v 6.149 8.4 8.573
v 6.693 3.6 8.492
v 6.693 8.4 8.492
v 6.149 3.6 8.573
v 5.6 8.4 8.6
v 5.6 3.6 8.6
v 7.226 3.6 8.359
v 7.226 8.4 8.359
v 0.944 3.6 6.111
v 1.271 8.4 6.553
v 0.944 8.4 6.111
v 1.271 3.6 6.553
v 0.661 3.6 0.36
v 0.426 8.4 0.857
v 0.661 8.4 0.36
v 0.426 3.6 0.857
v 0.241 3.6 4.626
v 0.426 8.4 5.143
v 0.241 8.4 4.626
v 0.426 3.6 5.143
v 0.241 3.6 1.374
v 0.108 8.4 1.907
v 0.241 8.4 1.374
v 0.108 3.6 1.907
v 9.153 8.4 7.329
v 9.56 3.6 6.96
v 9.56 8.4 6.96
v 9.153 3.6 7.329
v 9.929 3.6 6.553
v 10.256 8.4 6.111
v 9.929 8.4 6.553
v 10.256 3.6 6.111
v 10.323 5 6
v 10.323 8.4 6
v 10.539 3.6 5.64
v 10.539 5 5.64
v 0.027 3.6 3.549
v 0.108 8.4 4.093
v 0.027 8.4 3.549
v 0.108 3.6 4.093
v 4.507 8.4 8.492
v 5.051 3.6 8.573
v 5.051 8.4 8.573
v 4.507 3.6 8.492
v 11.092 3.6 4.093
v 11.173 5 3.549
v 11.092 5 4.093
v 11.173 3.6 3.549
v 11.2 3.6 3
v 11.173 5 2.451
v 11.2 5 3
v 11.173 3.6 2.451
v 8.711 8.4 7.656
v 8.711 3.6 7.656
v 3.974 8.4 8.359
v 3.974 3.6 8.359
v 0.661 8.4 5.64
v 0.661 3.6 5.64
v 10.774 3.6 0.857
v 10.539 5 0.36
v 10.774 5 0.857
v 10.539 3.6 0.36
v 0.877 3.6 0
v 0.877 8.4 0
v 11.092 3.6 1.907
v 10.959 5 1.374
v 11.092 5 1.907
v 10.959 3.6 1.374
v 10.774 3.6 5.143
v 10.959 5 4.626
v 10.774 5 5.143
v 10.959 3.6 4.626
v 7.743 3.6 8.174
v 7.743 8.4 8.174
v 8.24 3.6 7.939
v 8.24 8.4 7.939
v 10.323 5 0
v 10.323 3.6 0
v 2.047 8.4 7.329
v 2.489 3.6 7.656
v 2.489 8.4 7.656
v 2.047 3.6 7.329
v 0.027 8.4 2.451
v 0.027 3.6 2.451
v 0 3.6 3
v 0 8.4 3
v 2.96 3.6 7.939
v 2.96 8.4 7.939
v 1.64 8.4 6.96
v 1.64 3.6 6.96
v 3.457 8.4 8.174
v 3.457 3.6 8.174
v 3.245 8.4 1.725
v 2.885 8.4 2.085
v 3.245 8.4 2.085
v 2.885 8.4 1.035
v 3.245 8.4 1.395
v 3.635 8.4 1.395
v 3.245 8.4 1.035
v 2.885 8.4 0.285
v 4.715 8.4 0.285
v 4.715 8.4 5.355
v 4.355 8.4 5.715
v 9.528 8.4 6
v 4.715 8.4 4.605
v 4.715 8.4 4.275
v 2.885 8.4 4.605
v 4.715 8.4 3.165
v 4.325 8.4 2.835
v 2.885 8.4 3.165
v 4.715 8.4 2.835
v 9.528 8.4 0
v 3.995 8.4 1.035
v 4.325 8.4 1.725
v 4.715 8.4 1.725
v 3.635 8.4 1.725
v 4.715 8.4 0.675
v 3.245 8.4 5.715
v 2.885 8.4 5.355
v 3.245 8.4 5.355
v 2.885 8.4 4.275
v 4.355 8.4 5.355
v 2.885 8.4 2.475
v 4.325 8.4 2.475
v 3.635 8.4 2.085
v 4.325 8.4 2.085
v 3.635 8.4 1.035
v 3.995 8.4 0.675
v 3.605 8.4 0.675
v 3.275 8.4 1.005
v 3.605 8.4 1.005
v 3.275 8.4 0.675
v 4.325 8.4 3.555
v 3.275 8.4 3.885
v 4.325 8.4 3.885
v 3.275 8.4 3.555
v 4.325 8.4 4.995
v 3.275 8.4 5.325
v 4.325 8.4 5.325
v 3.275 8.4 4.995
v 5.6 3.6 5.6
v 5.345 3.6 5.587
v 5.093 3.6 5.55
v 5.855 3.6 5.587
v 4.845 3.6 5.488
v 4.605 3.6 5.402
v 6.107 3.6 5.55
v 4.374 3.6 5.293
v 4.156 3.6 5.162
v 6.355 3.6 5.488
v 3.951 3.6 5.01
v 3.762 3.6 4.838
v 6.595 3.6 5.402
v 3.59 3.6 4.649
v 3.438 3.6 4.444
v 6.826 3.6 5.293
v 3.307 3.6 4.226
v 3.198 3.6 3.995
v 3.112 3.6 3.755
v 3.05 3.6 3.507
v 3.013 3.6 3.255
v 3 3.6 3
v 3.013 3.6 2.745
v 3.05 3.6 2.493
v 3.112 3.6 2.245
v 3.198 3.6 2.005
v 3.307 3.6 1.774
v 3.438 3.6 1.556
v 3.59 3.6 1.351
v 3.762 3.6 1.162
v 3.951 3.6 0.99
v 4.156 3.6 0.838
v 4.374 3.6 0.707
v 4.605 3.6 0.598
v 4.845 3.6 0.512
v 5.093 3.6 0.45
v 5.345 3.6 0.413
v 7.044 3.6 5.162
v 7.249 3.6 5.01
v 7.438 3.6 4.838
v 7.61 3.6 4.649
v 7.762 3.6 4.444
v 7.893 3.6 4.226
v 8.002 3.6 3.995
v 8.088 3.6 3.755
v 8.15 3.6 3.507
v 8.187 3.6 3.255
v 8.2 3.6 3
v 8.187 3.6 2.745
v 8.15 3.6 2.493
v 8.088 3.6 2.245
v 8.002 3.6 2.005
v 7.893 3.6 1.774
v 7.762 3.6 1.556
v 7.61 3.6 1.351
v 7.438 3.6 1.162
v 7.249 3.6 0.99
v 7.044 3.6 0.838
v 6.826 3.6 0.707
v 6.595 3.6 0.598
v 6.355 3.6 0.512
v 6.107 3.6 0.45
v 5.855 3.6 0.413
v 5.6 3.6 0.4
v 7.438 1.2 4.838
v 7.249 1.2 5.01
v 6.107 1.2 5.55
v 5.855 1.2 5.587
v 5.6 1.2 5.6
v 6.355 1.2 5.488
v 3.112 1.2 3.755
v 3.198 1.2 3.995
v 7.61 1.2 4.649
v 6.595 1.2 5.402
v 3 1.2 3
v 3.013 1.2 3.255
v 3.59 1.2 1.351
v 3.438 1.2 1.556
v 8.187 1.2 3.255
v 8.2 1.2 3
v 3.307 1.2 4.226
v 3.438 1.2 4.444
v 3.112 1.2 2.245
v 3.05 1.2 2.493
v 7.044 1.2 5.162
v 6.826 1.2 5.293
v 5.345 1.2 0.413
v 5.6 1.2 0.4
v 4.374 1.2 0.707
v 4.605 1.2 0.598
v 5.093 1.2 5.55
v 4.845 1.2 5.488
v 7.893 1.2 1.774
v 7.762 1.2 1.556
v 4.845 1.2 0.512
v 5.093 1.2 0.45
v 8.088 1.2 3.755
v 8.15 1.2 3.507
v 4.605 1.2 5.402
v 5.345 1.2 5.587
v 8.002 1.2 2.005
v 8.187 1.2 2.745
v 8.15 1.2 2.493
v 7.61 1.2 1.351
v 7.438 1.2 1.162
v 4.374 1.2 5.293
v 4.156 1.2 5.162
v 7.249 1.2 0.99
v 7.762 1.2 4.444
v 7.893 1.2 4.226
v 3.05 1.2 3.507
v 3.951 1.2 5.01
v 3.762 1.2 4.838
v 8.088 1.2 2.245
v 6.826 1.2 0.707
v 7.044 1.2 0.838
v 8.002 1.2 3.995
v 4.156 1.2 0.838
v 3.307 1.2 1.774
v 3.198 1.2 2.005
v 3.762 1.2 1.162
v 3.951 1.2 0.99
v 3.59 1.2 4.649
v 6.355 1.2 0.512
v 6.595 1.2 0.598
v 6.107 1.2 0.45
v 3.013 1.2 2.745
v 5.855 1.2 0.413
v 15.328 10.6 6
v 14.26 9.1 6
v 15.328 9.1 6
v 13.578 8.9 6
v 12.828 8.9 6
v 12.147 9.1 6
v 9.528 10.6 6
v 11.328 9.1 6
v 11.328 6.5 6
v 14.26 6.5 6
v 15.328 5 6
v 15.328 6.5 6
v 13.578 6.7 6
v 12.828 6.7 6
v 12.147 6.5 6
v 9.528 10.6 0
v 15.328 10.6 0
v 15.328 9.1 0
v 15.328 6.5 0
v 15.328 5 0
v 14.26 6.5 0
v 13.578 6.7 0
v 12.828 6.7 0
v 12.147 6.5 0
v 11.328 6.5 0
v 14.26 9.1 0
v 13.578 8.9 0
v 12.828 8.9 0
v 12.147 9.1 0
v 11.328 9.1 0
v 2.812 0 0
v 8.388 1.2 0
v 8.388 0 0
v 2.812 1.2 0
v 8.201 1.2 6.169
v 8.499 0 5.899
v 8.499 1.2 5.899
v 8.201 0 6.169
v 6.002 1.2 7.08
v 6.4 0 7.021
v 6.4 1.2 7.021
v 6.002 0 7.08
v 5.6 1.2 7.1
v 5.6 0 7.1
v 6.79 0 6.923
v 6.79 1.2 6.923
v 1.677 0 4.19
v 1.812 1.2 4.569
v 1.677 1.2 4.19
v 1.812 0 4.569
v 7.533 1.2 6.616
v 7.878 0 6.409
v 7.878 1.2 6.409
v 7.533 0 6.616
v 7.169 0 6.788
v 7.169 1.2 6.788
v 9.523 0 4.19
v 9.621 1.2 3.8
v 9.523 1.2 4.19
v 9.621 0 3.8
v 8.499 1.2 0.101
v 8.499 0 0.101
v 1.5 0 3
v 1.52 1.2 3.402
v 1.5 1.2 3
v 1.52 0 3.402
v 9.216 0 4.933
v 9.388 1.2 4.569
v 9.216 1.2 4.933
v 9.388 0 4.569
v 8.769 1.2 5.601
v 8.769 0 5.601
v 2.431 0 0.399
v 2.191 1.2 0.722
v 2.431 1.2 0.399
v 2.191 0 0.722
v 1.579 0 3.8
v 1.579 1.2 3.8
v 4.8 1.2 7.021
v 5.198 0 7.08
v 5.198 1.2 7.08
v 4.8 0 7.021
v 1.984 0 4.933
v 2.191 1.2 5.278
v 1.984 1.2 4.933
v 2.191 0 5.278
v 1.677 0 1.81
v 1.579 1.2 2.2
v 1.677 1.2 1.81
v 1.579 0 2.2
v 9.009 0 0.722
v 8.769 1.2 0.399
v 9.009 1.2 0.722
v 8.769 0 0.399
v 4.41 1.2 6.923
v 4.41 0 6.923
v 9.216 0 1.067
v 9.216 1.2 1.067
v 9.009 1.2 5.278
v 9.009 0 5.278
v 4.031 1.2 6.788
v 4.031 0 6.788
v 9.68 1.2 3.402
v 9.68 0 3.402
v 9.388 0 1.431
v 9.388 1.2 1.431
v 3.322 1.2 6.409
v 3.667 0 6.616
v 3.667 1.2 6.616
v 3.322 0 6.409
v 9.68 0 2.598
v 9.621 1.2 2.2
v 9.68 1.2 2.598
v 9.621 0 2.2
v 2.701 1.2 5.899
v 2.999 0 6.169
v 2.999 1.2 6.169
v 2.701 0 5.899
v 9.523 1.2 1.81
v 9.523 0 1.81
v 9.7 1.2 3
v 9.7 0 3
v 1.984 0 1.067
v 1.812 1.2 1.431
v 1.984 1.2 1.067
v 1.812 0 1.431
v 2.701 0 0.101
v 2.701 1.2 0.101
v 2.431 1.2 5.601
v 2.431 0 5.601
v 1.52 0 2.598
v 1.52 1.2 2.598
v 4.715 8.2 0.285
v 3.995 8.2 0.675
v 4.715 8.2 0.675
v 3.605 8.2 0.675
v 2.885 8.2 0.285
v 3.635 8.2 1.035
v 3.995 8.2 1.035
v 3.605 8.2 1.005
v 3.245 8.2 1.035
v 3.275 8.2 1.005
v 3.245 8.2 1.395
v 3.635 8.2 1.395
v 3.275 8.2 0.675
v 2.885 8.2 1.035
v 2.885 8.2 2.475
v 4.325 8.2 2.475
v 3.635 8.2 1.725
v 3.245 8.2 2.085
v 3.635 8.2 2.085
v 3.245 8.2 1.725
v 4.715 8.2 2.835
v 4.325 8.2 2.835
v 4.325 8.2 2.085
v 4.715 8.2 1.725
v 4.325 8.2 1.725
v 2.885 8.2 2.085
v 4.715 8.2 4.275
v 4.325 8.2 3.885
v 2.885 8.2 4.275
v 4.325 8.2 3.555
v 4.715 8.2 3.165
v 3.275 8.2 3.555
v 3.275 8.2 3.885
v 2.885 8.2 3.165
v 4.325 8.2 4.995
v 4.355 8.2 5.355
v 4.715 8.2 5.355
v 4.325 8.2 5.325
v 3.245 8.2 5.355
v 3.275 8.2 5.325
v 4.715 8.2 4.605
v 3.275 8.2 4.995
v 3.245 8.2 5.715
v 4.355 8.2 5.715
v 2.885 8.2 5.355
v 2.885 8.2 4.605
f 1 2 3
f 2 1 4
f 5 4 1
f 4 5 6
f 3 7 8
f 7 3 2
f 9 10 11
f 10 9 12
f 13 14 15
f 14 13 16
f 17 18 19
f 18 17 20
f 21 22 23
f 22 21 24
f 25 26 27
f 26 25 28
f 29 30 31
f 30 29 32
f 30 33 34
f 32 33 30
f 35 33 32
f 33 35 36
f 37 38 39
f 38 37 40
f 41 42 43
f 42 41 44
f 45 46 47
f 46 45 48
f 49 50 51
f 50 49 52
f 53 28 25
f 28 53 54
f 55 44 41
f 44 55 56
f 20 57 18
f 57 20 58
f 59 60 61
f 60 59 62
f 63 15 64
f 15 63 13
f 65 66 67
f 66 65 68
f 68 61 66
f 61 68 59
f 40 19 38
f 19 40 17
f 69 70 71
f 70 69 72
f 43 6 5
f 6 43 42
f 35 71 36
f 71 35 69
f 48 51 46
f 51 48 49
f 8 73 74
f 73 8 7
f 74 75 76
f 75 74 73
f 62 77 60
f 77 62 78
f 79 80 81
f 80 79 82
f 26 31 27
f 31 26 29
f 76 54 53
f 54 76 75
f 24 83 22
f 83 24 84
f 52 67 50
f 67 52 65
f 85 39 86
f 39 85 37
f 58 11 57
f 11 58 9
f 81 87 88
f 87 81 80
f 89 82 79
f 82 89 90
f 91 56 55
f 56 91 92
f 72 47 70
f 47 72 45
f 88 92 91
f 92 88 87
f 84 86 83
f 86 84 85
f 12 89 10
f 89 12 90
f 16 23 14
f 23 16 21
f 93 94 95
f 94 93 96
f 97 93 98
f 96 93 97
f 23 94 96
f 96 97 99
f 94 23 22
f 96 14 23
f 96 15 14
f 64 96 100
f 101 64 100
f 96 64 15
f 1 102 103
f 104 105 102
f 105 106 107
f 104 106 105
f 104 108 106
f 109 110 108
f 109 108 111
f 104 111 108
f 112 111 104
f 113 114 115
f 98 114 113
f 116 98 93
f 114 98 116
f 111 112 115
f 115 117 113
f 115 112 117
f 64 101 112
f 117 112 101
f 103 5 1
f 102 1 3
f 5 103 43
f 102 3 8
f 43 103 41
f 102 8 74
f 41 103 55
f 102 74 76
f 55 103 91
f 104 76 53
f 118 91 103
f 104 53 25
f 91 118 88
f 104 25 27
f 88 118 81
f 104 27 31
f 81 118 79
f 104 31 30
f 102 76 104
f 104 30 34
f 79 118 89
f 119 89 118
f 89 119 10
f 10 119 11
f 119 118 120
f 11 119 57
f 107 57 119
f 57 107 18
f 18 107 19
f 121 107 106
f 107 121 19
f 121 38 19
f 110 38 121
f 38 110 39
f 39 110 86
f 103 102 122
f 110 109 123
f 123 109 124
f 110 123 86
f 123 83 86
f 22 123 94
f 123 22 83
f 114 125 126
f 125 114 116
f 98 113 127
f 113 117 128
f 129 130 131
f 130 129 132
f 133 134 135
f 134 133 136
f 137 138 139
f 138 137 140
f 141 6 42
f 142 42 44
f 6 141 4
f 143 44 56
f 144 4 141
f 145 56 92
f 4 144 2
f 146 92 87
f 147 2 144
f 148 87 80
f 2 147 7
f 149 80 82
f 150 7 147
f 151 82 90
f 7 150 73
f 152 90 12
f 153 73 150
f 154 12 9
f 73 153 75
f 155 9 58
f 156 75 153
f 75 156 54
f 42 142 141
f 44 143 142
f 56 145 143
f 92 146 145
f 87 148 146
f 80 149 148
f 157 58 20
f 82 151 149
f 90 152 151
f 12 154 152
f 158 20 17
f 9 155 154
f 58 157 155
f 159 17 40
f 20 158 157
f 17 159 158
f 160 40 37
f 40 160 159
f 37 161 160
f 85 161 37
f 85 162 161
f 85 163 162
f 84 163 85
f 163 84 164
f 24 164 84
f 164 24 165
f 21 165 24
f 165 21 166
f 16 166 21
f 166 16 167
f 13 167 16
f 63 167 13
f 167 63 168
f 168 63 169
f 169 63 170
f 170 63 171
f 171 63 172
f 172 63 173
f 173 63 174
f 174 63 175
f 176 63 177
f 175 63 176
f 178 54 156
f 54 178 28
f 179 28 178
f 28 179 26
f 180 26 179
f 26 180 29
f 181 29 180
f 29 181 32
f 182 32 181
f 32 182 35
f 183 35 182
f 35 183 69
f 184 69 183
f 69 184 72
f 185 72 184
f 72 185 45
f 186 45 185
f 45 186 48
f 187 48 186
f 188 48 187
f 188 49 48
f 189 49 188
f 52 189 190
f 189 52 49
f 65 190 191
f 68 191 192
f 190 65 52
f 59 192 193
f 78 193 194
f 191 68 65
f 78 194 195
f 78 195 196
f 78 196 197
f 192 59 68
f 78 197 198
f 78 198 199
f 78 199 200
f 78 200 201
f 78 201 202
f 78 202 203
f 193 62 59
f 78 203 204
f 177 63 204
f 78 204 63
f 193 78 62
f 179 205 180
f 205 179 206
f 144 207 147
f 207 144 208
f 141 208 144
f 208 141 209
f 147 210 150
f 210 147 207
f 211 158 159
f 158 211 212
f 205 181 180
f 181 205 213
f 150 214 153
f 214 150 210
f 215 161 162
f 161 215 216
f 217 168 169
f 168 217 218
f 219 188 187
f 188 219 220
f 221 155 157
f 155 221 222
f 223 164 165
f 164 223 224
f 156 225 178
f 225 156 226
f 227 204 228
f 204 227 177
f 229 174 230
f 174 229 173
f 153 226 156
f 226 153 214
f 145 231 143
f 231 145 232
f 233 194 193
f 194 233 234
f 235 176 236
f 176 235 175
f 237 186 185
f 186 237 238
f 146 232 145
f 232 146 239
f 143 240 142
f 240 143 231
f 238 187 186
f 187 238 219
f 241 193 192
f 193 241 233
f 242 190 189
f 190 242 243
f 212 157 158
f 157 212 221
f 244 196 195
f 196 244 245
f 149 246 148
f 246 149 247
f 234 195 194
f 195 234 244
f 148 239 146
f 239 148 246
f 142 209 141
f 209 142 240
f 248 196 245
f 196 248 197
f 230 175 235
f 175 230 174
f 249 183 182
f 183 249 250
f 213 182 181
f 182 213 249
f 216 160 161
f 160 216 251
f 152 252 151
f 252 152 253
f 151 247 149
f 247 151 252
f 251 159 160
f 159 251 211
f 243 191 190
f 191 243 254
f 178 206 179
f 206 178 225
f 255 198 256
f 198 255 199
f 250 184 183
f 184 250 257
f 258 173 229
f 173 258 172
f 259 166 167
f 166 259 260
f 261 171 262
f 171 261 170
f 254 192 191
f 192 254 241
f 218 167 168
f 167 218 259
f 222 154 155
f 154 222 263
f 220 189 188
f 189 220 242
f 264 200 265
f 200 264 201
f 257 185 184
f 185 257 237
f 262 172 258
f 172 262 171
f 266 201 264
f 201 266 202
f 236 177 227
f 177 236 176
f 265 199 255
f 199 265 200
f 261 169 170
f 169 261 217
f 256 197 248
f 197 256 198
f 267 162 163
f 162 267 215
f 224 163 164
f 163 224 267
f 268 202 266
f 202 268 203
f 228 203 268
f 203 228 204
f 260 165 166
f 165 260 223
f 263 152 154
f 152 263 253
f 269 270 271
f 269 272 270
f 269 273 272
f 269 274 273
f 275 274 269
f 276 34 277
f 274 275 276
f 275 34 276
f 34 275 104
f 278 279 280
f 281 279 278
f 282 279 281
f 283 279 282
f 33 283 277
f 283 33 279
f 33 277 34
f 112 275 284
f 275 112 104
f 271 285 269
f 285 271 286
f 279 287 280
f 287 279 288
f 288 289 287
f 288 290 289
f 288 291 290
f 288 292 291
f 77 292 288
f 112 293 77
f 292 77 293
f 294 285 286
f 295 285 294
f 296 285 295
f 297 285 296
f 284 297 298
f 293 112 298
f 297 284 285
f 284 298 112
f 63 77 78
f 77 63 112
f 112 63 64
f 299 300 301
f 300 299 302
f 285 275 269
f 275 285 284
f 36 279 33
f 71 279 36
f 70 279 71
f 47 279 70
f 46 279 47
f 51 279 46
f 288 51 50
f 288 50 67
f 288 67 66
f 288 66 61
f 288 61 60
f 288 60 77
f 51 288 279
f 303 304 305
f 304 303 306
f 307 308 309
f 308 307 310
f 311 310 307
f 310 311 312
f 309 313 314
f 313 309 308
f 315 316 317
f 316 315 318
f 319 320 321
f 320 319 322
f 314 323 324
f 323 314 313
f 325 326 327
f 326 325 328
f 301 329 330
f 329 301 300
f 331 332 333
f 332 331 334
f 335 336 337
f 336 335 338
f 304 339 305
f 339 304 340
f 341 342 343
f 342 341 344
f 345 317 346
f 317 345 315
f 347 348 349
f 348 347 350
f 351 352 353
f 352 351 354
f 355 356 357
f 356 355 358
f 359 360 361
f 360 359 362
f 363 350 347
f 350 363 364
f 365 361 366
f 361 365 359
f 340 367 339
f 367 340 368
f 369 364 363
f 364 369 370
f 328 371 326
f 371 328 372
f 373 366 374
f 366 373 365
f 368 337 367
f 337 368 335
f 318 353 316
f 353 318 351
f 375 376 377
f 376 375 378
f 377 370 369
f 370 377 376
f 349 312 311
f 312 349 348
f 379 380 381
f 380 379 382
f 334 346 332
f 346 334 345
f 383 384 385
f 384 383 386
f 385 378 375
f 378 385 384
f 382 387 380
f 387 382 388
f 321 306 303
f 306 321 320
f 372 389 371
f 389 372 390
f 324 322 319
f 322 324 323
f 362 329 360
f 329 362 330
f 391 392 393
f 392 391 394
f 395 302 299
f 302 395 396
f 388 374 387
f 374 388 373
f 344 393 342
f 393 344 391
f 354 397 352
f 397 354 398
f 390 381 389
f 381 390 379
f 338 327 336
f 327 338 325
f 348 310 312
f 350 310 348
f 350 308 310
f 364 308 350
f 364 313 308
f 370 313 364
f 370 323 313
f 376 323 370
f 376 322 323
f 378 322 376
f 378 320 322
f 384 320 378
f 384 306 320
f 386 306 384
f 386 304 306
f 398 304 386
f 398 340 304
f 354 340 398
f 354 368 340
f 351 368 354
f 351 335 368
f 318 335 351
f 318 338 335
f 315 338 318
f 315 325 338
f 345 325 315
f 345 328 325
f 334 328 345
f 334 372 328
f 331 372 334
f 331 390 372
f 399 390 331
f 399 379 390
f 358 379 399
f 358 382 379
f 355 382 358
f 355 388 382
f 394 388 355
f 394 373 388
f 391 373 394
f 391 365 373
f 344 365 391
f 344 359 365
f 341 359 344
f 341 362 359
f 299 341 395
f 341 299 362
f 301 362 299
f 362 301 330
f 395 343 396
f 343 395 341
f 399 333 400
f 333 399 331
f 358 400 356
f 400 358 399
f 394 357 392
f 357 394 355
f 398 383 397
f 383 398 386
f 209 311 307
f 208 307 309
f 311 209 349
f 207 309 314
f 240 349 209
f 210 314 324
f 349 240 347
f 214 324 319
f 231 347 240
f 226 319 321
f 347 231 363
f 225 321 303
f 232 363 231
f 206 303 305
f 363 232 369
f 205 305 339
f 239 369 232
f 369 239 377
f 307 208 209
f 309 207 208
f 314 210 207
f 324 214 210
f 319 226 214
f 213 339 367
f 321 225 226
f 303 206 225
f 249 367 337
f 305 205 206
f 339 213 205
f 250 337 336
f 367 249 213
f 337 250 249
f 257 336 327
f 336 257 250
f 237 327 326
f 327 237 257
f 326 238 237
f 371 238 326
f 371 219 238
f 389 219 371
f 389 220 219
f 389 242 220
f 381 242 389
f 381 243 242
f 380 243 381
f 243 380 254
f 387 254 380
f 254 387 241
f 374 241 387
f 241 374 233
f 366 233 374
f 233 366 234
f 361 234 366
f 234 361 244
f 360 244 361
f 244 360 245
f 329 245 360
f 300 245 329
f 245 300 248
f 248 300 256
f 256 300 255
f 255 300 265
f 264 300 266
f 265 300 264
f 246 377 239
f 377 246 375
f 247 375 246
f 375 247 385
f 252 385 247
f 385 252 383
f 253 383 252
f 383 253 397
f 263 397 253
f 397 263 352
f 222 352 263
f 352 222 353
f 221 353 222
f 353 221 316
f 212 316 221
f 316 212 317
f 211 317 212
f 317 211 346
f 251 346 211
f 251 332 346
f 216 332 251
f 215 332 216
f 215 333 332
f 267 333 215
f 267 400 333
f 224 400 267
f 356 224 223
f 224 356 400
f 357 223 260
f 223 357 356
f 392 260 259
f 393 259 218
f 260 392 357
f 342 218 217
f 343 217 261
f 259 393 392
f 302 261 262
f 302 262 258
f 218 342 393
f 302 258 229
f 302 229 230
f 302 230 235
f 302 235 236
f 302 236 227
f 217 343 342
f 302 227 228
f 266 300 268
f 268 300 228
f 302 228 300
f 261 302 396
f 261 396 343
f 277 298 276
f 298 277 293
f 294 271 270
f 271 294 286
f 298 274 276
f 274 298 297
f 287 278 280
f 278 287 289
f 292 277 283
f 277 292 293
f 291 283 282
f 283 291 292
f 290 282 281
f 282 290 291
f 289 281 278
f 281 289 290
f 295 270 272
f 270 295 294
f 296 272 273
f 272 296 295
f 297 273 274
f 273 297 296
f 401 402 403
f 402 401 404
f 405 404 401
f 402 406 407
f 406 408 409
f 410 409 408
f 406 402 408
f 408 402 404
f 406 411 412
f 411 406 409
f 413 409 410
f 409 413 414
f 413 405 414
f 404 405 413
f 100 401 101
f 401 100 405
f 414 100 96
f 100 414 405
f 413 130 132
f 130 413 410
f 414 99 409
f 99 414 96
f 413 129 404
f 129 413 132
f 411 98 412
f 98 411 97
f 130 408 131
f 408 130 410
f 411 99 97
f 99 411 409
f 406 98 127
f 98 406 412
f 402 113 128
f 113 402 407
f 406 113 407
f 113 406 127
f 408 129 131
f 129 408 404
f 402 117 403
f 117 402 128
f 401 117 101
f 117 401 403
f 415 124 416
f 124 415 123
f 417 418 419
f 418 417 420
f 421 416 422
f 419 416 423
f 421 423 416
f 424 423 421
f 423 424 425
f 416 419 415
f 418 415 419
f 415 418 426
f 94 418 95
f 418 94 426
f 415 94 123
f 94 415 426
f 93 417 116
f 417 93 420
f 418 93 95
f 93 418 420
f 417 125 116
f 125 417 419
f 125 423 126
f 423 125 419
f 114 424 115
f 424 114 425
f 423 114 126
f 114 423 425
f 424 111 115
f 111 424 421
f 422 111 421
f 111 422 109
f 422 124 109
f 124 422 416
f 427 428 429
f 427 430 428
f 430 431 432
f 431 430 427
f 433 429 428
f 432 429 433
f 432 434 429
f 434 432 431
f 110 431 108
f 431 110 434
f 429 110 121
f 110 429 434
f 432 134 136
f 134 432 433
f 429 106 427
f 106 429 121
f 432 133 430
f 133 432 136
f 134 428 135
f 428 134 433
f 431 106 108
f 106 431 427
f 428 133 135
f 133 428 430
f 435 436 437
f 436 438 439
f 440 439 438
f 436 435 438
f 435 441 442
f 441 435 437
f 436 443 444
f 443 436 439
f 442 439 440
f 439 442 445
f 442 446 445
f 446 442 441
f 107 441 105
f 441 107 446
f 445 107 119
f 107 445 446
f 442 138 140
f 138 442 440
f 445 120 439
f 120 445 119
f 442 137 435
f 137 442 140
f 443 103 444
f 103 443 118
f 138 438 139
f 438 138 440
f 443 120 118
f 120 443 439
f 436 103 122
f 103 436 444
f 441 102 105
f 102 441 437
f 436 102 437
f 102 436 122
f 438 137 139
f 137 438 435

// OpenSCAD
// 純打印邊牆夾與帶頭樞軸
$fn=64;
translate([125.6,-23.9,51]){rotate([0,-90,0]){difference(){union(){difference(){intersection(){union(){union(){translate([-51,28.9,110.27161]){cube([6,5.6,5.8]);}union(){translate([-48,27.5,120]){rotate([-90,0,0]){translate([0,0,0]){cylinder(h=4.8,d1=11.2,d2=11.2,$fn=64);}}}translate([-48,25.08,120]){rotate([-90,0,0]){translate([0,0,0]){cylinder(h=2.44,d1=5.2,d2=5.2,$fn=64);}}}}}translate([-48,23.9,120]){rotate([-90,0,0]){translate([0,0,0]){cylinder(h=1.2,d1=8.2,d2=8.2,$fn=64);}}}}translate([-51,-10,100]){cube([30,60,40]);}}translate([-52,30.4,84.27161]){cube([8,2.6,30]);}}union(){multmatrix([[0,0,1,-51],[1,0,0,0],[0,1,0,0],[0,0,0,1]]){translate([0,0,0]){linear_extrude(height=6)polygon([[30.38,111.27161],[30.6,112.02161],[30.6,112.77161],[30.38,113.52161]]);}}multmatrix([[0,0,1,-51],[1,0,0,0],[0,1,0,0],[0,0,0,1]]){translate([0,0,0]){linear_extrude(height=6)polygon([[33.02,113.52161],[32.8,112.77161],[32.8,112.02161],[33.02,111.27161]]);}}}}multmatrix([[1,0,0,-48],[0,0,1,32.3],[0,1,0,121.8],[0,0,0,1]]){union(){union(){union(){union(){union(){union(){union(){union(){union(){union(){union(){union(){union(){union(){union(){union(){union(){union(){union(){union(){union(){union(){union(){union(){union(){union(){union(){union(){union(){union(){union(){union(){union(){union(){union(){union(){union(){translate([-2.715,0.525,-0.2]){cube([0.39,0.39,0.32]);}translate([-2.355,0.525,-0.2]){cube([0.39,0.39,0.32]);}}translate([-2.715,0.165,-0.2]){cube([0.39,0.39,0.32]);}}translate([-1.995,0.165,-0.2]){cube([0.39,0.39,0.32]);}}translate([-2.715,-0.195,-0.2]){cube([0.39,0.39,0.32]);}}translate([-2.355,-0.195,-0.2]){cube([0.39,0.39,0.32]);}}translate([-2.715,-0.555,-0.2]){cube([0.39,0.39,0.32]);}}translate([-2.715,-0.915,-0.2]){cube([0.39,0.39,0.32]);}}translate([-0.915,0.525,-0.2]){cube([0.39,0.39,0.32]);}}translate([-1.275,0.165,-0.2]){cube([0.39,0.39,0.32]);}}translate([-0.915,0.165,-0.2]){cube([0.39,0.39,0.32]);}}translate([-0.915,-0.195,-0.2]){cube([0.39,0.39,0.32]);}}translate([-0.915,-0.555,-0.2]){cube([0.39,0.39,0.32]);}}translate([-1.275,-0.915,-0.2]){cube([0.39,0.39,0.32]);}}translate([-0.915,-0.915,-0.2]){cube([0.39,0.39,0.32]);}}translate([-0.555,-0.915,-0.2]){cube([0.39,0.39,0.32]);}}translate([0.165,0.525,-0.2]){cube([0.39,0.39,0.32]);}}translate([0.525,0.525,-0.2]){cube([0.39,0.39,0.32]);}}translate([0.885,0.525,-0.2]){cube([0.39,0.39,0.32]);}}translate([0.165,0.165,-0.2]){cube([0.39,0.39,0.32]);}}translate([0.885,0.165,-0.2]){cube([0.39,0.39,0.32]);}}translate([0.165,-0.195,-0.2]){cube([0.39,0.39,0.32]);}}translate([0.885,-0.195,-0.2]){cube([0.39,0.39,0.32]);}}translate([0.165,-0.555,-0.2]){cube([0.39,0.39,0.32]);}}translate([0.885,-0.555,-0.2]){cube([0.39,0.39,0.32]);}}translate([0.165,-0.915,-0.2]){cube([0.39,0.39,0.32]);}}translate([0.525,-0.915,-0.2]){cube([0.39,0.39,0.32]);}}translate([0.885,-0.915,-0.2]){cube([0.39,0.39,0.32]);}}translate([1.605,0.525,-0.2]){cube([0.39,0.39,0.32]);}}translate([1.965,0.525,-0.2]){cube([0.39,0.39,0.32]);}}translate([1.605,0.165,-0.2]){cube([0.39,0.39,0.32]);}}translate([2.325,0.165,-0.2]){cube([0.39,0.39,0.32]);}}translate([1.605,-0.195,-0.2]){cube([0.39,0.39,0.32]);}}translate([2.325,-0.195,-0.2]){cube([0.39,0.39,0.32]);}}translate([1.605,-0.555,-0.2]){cube([0.39,0.39,0.32]);}}translate([2.325,-0.555,-0.2]){cube([0.39,0.39,0.32]);}}translate([1.605,-0.915,-0.2]){cube([0.39,0.39,0.32]);}}translate([1.965,-0.915,-0.2]){cube([0.39,0.39,0.32]);}}}}}}
